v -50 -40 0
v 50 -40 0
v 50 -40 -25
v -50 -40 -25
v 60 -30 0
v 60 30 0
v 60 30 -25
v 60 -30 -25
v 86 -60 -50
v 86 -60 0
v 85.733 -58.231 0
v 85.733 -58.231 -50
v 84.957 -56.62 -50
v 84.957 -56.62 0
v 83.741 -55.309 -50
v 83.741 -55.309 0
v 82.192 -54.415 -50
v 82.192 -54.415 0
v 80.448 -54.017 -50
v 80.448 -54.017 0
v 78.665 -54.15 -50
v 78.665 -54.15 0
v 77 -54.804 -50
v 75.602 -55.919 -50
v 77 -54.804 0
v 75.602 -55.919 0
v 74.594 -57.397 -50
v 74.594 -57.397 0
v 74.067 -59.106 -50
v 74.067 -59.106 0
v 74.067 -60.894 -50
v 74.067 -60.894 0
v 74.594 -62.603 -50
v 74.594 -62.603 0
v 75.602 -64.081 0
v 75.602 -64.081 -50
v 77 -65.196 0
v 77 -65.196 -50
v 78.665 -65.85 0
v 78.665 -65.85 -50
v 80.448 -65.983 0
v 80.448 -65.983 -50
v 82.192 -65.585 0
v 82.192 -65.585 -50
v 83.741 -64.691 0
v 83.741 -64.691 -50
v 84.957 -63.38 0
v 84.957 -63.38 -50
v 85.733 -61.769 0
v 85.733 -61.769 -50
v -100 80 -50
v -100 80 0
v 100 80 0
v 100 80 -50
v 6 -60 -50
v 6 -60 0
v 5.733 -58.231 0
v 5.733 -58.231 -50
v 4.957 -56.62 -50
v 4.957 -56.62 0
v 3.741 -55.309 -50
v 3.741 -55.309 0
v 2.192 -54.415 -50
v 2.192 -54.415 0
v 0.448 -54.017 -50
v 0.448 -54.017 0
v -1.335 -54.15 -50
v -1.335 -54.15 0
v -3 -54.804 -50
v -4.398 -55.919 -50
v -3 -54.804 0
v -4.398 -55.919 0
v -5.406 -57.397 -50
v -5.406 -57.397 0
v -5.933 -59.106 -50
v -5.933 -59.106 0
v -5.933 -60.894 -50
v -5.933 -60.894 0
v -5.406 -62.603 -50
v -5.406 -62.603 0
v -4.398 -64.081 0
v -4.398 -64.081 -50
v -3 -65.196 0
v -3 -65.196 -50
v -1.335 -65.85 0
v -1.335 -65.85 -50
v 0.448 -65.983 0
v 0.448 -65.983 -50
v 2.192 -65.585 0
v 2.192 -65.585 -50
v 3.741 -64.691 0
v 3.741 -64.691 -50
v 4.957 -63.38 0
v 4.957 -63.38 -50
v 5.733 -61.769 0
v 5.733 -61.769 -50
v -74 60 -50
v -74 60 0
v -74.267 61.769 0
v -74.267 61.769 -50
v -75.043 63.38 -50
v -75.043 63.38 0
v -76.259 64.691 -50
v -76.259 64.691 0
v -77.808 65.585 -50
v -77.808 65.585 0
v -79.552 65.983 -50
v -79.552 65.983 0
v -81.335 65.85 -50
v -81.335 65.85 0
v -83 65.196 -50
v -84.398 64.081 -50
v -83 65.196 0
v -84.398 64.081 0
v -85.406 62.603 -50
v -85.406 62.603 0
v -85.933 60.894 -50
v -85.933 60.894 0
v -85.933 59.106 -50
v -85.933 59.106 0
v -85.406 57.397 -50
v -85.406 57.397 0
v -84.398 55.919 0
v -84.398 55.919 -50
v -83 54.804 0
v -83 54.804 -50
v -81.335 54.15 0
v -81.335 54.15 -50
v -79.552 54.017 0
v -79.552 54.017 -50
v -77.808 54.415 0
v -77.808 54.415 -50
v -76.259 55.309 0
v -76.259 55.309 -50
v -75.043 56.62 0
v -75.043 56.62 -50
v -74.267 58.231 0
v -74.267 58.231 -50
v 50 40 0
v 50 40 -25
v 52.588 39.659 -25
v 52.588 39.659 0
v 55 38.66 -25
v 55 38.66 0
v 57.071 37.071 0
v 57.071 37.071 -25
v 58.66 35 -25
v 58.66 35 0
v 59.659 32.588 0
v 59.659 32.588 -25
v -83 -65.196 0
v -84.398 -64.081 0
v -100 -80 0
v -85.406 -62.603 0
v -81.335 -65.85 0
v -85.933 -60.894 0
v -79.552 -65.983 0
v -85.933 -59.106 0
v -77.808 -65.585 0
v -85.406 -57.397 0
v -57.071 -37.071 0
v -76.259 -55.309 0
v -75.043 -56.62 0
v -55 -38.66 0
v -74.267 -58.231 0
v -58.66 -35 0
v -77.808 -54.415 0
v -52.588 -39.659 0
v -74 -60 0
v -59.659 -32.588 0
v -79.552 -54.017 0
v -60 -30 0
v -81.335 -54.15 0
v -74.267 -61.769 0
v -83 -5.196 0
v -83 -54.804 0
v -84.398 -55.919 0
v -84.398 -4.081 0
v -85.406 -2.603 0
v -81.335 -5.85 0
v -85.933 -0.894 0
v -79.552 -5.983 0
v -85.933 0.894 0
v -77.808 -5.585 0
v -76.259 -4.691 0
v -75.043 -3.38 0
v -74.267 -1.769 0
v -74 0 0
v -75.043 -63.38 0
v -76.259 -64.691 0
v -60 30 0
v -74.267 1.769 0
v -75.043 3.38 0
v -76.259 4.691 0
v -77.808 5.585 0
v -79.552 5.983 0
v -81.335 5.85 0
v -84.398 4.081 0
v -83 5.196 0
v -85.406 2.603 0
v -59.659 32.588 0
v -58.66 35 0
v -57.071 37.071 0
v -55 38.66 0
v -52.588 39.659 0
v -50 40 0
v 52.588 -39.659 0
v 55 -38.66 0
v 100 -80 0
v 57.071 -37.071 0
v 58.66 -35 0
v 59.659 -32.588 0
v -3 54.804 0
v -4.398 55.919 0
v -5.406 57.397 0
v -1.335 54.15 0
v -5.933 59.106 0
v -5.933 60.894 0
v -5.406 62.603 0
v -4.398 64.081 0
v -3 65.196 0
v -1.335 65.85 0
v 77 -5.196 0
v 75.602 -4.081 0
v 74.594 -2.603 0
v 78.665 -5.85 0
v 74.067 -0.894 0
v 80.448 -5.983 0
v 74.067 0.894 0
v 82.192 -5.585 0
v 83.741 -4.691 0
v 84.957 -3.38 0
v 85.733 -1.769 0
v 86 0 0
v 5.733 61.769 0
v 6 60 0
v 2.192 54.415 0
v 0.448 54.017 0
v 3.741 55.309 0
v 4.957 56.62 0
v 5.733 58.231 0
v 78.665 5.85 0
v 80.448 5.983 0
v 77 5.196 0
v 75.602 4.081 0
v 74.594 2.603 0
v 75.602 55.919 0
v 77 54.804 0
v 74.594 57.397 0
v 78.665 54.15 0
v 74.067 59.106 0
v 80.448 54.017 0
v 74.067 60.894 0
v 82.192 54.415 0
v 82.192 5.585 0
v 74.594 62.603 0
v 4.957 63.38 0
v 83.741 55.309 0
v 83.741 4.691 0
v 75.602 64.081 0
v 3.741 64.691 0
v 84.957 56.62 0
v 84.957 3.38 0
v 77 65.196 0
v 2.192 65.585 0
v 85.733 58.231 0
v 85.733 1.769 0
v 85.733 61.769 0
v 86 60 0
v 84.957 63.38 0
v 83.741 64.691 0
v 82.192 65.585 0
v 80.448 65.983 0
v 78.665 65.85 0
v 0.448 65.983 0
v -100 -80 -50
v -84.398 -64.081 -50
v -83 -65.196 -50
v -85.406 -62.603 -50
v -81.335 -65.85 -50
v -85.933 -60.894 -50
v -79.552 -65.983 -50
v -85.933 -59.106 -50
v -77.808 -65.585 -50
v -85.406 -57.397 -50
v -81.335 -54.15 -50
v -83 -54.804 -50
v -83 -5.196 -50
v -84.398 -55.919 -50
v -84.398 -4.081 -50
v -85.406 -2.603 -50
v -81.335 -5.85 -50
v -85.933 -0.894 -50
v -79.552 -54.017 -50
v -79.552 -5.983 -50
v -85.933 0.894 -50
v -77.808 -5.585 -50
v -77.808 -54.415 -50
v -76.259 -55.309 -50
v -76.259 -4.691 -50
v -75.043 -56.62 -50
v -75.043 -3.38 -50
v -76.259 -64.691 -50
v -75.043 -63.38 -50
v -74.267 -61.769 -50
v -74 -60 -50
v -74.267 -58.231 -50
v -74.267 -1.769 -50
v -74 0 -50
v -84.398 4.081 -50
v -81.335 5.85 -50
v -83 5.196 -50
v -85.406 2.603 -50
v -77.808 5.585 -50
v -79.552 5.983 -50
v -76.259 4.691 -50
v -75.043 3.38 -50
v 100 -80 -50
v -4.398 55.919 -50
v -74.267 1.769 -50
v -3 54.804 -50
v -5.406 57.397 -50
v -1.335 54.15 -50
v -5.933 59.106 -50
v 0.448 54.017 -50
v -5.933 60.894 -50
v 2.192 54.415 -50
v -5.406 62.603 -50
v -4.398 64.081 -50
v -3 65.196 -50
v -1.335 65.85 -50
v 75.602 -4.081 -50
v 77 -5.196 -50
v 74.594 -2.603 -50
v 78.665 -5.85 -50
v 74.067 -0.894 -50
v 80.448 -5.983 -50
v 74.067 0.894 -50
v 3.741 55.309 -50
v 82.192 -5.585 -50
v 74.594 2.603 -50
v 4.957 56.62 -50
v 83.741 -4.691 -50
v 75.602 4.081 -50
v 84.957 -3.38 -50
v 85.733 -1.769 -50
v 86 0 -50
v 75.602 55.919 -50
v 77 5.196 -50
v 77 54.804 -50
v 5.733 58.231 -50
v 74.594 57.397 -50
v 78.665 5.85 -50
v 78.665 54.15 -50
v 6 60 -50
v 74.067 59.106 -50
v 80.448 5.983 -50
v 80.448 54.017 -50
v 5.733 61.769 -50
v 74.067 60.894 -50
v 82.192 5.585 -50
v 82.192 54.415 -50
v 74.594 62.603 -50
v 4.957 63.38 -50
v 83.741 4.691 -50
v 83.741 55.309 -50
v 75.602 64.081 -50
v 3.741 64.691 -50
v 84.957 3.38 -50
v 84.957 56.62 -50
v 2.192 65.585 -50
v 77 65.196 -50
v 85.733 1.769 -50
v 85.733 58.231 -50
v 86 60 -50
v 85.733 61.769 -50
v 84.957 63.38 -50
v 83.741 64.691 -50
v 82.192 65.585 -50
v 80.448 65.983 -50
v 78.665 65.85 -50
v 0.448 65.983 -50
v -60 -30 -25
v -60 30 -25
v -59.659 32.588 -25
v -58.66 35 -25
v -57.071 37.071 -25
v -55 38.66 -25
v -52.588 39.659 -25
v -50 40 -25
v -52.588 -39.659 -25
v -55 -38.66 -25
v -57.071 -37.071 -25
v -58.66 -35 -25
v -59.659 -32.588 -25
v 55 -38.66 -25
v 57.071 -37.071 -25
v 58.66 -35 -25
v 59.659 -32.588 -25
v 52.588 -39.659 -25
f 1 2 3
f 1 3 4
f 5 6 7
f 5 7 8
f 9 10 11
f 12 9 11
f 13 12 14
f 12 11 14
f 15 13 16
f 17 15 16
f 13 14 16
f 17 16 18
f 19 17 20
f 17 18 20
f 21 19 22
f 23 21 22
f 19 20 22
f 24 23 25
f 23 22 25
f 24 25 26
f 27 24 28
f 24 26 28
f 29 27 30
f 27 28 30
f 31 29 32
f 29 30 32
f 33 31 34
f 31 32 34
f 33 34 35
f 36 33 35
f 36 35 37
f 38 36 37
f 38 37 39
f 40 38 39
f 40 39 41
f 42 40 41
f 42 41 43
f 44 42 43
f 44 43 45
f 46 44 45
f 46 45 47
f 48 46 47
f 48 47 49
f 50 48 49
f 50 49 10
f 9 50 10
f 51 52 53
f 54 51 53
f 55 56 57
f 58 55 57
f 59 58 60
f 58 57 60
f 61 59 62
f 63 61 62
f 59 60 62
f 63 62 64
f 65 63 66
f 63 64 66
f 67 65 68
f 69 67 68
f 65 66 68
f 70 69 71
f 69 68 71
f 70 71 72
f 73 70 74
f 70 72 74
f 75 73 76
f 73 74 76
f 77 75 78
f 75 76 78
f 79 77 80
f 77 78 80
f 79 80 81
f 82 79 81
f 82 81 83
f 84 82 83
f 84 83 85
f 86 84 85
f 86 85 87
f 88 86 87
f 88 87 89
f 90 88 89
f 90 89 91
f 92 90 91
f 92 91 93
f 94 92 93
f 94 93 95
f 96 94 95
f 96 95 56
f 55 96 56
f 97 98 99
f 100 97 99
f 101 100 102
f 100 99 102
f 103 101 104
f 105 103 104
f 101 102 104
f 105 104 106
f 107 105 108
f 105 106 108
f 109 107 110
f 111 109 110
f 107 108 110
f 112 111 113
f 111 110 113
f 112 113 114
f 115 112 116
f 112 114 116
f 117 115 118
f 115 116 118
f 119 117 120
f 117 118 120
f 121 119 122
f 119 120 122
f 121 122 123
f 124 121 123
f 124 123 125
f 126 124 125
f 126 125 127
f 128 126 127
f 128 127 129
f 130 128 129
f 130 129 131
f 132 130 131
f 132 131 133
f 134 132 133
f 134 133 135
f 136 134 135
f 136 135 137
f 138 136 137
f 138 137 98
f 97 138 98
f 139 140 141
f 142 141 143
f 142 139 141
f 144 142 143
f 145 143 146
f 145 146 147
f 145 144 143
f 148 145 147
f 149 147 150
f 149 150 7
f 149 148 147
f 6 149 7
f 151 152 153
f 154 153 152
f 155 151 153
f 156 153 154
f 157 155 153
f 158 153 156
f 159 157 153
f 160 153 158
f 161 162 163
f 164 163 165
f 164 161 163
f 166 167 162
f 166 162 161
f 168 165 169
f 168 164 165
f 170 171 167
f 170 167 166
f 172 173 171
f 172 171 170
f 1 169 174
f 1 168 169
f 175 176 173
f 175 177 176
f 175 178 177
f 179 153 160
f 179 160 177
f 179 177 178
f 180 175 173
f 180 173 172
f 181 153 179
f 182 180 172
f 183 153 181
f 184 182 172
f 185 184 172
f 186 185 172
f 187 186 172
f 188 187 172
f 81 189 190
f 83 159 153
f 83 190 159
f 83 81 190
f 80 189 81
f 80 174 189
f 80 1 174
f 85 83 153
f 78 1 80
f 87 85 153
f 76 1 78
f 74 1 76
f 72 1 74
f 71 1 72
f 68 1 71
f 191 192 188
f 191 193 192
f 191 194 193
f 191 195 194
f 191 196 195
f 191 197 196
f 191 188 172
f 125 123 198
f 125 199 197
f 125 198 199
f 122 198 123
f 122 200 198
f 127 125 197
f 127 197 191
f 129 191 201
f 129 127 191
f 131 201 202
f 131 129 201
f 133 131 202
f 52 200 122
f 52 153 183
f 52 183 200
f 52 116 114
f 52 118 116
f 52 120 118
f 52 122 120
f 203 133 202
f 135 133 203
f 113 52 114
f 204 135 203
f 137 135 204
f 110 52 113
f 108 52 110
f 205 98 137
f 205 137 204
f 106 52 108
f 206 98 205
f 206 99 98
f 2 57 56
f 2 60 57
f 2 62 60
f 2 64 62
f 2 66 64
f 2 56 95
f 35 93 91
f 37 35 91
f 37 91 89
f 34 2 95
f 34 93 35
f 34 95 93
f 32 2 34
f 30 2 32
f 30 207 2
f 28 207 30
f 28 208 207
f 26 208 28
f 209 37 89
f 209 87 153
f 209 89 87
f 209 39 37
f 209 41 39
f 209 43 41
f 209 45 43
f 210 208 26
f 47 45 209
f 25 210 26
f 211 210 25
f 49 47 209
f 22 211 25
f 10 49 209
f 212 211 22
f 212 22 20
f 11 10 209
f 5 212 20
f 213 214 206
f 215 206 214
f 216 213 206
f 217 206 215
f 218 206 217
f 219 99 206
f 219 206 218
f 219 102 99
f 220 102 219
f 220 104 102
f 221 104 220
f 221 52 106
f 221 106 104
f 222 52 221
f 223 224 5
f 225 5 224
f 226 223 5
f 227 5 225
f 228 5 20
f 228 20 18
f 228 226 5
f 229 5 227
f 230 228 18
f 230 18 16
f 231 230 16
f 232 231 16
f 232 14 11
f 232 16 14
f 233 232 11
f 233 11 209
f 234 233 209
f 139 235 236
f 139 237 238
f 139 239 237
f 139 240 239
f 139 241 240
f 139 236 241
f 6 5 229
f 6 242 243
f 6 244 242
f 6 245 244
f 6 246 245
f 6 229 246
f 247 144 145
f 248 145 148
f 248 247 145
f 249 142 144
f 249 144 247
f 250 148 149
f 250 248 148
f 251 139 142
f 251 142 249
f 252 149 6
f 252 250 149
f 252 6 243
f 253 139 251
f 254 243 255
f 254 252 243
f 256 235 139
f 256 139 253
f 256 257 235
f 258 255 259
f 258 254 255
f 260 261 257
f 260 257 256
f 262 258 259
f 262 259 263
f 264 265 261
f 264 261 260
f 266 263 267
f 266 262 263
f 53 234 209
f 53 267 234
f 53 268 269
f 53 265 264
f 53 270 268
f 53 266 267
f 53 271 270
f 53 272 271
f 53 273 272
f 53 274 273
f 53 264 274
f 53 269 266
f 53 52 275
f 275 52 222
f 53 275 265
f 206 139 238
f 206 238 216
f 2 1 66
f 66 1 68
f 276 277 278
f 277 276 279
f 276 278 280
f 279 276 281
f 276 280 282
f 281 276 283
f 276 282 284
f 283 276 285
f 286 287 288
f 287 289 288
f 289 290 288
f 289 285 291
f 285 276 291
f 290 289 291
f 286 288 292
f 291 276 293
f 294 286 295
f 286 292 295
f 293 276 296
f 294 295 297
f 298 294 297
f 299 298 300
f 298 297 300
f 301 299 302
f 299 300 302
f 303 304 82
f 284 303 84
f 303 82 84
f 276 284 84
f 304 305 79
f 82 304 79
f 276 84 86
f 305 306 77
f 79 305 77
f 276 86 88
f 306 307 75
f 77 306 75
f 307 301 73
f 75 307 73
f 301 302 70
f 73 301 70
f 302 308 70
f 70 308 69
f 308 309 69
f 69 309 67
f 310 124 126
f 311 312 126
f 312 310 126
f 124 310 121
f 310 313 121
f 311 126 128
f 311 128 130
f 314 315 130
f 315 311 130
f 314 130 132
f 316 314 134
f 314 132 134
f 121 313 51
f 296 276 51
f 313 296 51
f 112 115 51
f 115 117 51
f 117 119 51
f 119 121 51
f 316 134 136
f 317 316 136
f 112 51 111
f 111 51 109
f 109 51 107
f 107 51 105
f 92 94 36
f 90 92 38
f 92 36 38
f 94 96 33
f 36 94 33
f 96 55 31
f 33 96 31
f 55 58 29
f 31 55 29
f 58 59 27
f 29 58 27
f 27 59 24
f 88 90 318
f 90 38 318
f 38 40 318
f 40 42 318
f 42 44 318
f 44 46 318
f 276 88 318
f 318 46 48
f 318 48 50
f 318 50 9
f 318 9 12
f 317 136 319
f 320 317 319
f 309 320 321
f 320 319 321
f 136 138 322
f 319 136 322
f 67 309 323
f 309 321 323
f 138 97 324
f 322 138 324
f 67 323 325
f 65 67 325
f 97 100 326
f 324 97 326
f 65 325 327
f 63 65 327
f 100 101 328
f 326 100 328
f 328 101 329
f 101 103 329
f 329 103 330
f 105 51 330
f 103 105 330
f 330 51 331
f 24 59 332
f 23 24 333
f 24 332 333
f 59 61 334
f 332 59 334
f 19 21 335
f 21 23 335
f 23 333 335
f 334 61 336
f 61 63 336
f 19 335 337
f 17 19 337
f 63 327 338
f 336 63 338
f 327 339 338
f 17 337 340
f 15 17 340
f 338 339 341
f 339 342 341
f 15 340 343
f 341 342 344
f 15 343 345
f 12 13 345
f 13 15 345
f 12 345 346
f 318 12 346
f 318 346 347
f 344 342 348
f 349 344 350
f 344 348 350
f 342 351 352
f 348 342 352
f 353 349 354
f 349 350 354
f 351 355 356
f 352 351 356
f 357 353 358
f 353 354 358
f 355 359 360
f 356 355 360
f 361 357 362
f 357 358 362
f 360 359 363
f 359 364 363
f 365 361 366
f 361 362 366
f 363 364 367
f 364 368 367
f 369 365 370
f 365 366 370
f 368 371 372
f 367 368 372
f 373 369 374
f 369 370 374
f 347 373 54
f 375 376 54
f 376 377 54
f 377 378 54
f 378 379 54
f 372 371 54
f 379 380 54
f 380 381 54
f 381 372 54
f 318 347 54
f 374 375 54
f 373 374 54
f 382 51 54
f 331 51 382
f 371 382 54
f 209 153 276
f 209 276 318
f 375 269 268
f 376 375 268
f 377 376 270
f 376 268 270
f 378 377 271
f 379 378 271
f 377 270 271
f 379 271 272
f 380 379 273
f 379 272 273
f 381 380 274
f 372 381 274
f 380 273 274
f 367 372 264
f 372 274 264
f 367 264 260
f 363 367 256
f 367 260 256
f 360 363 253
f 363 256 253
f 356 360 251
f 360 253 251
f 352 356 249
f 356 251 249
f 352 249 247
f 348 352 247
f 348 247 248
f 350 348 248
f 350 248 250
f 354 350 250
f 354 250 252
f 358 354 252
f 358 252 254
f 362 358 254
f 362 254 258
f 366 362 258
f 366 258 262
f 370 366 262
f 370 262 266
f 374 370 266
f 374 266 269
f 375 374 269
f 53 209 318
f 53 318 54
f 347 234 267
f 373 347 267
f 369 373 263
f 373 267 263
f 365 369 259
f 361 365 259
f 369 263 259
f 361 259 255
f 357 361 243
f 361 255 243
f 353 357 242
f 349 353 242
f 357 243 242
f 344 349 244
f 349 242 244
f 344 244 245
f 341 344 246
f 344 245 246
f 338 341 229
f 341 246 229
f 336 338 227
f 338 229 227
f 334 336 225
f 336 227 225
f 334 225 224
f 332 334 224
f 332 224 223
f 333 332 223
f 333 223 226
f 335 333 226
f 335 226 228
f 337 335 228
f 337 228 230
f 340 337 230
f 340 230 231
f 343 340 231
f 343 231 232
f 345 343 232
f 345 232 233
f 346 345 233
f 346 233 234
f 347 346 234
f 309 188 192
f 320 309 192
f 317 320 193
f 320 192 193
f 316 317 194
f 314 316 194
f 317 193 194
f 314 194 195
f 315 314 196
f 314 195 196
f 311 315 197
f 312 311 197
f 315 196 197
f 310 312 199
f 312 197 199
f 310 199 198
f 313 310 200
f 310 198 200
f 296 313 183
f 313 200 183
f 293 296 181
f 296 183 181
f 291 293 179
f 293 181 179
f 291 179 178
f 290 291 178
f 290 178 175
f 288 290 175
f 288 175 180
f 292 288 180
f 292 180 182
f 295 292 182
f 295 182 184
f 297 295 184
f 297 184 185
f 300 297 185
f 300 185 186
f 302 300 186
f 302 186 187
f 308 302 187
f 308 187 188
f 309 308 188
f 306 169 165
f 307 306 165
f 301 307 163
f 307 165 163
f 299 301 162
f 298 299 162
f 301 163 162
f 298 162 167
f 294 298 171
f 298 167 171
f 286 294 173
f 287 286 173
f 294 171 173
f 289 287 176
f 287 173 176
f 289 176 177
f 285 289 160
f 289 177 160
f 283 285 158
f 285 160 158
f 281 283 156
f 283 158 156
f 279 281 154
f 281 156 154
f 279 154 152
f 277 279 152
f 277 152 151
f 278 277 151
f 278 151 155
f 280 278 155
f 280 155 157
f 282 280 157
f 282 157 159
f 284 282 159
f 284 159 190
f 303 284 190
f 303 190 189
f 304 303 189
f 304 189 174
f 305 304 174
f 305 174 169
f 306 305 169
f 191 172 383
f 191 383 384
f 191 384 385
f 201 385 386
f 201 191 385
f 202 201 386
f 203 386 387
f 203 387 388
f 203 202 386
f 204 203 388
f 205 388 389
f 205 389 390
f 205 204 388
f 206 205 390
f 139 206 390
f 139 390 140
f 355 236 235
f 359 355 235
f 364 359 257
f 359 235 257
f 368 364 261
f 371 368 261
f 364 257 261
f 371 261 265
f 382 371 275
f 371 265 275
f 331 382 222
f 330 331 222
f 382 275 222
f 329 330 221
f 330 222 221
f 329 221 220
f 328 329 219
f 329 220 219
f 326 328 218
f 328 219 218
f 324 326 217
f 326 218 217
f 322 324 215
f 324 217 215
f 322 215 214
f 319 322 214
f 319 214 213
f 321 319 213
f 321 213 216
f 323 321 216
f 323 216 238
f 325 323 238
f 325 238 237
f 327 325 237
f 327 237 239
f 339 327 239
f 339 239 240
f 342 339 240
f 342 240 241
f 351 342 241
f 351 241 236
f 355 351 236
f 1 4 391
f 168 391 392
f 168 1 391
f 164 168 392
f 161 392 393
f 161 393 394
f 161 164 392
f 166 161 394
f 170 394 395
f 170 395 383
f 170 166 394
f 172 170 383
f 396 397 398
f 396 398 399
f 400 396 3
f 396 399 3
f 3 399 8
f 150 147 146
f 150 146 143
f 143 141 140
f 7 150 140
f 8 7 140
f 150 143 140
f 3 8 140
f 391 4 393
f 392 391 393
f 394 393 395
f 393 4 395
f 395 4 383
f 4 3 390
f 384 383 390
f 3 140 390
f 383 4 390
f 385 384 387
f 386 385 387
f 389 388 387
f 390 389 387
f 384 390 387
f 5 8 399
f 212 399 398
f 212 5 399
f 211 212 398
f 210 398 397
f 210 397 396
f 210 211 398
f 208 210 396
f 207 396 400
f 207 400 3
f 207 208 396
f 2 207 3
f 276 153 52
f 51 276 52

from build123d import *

# Parameters (mm, degrees)
SKETCH1_W          = 200
SKETCH1_H          = 160
BASE_EXTRUDE_DEPTH = 50
CUT_EXTRUDE1_DEPTH = 25
SKETCH3_R          = 6
CUT_EXTRUDE2_DEPTH = 138.477270849


with BuildPart() as part:
    # Sketch1 → Base-Extrude (new body)
    with BuildSketch(Plane.XY):
        Rectangle(SKETCH1_W, SKETCH1_H)
    extrude(amount=-BASE_EXTRUDE_DEPTH)

    # Sketch2 → Cut-Extrude1 (cut)
    with BuildSketch(Plane.XY):
        with BuildLine():
            Line((-50, 40), (50, 40))
            ThreePointArc((50, 40), (57.071067812, 37.071067812), (60, 30))
            Line((60, 30), (60, -30))
            ThreePointArc((60, -30), (57.071067812, -37.071067812), (50, -40))
            Line((50, -40), (-50, -40))
            ThreePointArc((-50, -40), (-57.071067812, -37.071067812), (-60, -30))
            Line((-60, -30), (-60, 30))
            ThreePointArc((-60, 30), (-57.071067812, 37.071067812), (-50, 40))
        make_face()
    extrude(amount=-CUT_EXTRUDE1_DEPTH, mode=Mode.SUBTRACT)

    # Sketch3 → Cut-Extrude2 (cut, through all)
    with BuildSketch(Plane.XY):
        with Locations((-80, 60)):
            Circle(SKETCH3_R)
        with Locations((-80, 0)):
            Circle(SKETCH3_R)
        with Locations((-80, -60)):
            Circle(SKETCH3_R)
        with Locations((80, -60)):
            Circle(SKETCH3_R)
        with Locations((80, 0)):
            Circle(SKETCH3_R)
        with Locations((80, 60)):
            Circle(SKETCH3_R)
        with Locations((0, -60)):
            Circle(SKETCH3_R)
        with Locations((0, 60)):
            Circle(SKETCH3_R)
    extrude(amount=-CUT_EXTRUDE2_DEPTH, mode=Mode.SUBTRACT)


solid = part.part
